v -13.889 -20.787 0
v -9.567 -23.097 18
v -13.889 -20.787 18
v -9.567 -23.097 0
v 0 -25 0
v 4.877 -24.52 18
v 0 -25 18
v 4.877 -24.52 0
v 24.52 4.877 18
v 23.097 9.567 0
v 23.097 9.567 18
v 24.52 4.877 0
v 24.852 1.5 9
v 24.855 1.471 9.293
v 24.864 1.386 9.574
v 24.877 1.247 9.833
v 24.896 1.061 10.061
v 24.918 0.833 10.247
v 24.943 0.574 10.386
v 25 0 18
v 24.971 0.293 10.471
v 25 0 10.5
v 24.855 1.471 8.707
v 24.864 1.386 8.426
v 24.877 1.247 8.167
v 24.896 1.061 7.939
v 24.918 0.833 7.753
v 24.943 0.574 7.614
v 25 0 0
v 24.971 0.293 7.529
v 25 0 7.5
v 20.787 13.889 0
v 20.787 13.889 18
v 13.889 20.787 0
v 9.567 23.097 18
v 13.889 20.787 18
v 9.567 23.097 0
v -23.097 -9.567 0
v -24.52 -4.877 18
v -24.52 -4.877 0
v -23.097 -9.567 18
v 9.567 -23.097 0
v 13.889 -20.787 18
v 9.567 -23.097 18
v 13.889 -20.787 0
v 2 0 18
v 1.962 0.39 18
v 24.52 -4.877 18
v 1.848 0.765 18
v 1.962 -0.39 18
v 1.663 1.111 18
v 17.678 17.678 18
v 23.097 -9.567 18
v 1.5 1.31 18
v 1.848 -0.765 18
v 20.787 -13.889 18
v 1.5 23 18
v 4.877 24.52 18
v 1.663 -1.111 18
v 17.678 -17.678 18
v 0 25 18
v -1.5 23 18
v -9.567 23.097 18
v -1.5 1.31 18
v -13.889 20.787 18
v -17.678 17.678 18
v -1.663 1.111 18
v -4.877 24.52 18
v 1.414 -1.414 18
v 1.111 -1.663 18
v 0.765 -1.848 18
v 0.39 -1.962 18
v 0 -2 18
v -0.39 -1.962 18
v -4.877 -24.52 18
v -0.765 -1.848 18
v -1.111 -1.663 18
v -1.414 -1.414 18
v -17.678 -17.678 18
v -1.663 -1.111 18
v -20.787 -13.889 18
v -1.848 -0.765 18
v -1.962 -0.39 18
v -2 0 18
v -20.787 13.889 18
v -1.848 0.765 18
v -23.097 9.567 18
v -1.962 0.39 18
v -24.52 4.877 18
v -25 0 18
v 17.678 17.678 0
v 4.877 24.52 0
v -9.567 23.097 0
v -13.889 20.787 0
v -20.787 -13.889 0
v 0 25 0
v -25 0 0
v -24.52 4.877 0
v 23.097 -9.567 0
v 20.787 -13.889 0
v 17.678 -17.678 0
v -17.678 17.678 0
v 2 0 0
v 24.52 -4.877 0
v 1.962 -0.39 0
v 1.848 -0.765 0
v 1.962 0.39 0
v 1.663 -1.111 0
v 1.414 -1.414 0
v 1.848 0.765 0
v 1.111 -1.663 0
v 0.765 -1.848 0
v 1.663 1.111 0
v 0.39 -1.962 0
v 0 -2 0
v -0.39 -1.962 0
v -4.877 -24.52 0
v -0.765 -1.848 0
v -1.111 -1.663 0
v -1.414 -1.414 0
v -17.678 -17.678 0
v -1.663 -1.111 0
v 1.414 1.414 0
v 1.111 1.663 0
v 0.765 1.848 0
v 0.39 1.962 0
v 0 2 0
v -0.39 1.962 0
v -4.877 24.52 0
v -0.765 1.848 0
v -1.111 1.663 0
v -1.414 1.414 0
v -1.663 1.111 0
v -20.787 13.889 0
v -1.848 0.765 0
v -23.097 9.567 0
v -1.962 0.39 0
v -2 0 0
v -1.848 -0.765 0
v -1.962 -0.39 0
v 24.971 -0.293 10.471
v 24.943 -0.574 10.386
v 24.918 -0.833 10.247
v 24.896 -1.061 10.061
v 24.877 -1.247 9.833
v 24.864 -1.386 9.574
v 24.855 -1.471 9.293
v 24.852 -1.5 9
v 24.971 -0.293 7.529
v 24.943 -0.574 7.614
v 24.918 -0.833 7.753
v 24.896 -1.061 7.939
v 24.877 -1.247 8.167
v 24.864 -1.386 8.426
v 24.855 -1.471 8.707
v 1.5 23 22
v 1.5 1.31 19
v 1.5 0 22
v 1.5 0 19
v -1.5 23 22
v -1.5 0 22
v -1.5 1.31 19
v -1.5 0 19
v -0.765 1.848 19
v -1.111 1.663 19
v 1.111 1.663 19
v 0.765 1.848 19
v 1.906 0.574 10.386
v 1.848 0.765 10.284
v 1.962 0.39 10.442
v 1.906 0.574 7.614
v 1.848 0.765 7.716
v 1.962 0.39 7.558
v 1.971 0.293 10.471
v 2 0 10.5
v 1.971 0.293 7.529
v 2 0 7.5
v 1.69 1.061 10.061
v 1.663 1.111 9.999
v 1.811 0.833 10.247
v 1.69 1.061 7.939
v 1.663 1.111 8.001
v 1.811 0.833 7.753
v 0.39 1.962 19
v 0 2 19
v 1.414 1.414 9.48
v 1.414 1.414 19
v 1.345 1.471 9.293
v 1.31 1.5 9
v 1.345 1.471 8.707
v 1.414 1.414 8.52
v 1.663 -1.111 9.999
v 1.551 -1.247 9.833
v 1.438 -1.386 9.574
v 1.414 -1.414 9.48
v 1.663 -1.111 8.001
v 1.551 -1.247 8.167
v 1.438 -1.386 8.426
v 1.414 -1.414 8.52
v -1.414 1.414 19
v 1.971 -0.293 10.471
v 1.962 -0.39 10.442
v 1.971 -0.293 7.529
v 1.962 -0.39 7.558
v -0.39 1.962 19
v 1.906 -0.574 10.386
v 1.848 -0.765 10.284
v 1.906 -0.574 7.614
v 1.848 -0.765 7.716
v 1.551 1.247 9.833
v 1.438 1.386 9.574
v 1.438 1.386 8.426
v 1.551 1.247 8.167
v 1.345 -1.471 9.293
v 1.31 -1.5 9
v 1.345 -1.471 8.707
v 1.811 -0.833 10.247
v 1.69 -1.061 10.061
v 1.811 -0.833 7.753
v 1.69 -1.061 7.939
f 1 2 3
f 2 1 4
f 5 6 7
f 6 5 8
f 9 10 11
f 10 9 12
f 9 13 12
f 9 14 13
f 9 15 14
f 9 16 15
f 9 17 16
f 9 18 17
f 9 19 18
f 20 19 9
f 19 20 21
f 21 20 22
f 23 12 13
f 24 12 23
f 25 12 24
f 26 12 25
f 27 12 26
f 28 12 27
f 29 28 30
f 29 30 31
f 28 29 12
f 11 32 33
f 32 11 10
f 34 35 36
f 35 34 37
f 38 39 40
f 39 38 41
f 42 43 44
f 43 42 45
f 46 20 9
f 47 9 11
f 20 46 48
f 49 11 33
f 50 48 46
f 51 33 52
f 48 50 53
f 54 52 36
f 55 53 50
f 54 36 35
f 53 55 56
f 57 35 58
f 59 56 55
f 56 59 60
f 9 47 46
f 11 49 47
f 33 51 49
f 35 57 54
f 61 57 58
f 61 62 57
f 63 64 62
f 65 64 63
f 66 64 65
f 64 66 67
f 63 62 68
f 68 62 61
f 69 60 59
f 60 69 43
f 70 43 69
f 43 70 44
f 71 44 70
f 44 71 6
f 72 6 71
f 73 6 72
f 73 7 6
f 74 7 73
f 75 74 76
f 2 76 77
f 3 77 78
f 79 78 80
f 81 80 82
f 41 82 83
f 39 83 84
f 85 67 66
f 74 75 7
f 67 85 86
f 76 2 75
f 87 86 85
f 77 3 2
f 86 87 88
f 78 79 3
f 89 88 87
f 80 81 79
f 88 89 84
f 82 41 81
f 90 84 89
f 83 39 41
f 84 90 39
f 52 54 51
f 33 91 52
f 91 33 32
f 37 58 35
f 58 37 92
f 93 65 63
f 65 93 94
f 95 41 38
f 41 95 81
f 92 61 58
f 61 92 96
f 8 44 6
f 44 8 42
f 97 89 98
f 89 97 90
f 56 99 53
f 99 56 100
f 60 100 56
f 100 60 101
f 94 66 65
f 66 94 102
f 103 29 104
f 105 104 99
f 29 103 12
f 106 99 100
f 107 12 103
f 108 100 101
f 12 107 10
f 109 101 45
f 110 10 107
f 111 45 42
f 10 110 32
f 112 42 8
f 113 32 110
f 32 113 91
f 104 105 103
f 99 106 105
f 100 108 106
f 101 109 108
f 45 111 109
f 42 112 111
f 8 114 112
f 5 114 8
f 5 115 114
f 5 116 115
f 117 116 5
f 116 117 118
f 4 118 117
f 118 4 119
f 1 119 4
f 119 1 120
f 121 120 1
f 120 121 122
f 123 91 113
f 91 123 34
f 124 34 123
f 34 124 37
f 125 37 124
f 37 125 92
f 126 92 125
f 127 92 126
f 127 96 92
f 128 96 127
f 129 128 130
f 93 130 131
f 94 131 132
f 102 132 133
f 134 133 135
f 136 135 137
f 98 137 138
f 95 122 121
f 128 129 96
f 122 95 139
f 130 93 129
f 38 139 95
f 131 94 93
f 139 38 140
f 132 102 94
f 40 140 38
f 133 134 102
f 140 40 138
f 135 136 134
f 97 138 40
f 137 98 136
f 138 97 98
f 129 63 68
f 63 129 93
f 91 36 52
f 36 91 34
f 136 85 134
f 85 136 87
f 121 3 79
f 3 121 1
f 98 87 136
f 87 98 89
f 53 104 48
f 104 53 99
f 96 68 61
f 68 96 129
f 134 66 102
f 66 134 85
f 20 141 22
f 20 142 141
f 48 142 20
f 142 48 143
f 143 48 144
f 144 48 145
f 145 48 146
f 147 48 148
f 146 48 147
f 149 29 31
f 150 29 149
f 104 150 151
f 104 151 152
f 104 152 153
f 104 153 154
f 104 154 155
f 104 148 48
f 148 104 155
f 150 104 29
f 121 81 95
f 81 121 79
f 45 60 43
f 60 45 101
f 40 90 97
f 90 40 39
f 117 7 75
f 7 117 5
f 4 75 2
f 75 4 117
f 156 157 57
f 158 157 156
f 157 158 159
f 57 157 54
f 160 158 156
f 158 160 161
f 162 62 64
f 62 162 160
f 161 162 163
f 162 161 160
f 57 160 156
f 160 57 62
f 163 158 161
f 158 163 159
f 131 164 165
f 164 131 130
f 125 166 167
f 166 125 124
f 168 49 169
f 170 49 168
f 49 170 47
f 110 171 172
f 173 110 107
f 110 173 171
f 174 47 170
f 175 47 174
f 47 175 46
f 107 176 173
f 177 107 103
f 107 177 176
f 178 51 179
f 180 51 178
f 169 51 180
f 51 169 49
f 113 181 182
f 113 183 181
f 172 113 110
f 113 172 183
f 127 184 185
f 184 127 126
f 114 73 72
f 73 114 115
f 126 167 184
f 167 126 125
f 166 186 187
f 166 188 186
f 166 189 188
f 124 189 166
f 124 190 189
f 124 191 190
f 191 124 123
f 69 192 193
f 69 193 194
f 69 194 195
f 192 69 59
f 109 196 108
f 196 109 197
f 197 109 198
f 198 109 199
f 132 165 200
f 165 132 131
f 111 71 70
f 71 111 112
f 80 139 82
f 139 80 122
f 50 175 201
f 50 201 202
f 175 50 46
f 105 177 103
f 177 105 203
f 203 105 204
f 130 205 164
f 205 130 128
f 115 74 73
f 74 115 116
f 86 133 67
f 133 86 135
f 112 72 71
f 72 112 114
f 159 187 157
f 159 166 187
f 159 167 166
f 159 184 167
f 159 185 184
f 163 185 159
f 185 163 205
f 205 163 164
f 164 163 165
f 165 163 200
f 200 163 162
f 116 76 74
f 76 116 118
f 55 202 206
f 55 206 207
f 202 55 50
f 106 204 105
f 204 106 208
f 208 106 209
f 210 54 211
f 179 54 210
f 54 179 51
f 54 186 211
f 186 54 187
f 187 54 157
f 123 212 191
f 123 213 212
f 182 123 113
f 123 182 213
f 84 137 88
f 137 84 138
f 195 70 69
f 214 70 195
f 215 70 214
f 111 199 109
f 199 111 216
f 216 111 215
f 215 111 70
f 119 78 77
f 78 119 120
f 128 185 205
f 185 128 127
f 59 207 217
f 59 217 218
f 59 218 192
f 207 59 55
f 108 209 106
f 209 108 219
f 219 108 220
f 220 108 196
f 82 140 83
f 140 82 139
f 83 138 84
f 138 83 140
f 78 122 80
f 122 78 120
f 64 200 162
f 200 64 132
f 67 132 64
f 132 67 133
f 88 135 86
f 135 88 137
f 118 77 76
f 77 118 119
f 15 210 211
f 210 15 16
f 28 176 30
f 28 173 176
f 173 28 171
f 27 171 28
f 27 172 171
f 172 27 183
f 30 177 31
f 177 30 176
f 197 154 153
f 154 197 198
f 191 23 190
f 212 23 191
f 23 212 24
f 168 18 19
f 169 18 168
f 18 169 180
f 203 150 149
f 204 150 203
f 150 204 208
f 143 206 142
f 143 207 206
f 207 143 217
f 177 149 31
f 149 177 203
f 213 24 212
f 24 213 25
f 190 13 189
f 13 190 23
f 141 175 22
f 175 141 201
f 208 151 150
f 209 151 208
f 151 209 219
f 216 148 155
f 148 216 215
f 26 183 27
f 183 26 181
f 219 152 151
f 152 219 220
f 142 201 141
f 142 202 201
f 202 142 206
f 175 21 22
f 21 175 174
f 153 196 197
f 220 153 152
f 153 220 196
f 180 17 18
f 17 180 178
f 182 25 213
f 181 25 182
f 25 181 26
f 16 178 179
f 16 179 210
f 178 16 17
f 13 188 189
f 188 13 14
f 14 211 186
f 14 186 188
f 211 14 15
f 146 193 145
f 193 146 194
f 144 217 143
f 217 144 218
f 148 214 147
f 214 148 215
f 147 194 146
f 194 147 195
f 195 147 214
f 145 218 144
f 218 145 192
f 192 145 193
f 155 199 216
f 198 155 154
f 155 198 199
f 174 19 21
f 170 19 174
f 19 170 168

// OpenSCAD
$fn = 32;

// ----------------------------------------------------------------------
// Control knob: pointer knob
// ----------------------------------------------------------------------

// --- parameters (mm) ---
rib_w = 3;                // pointer rib width
rib_h = 5;                // pointer rib height
knob_d = 50;              // knob body diameter
knob_h = 18;              // knob body height
bore_d = 4;               // shaft bore diameter
set_d = 3;                // set screw bore diameter
fit_tol = 0.1;            // tolerance for press fits, mm
free_tol = 0.3;           // tolerance for clearance fits, mm

rib_poke = rib_h - 1;  // rib height above the top
total_h = knob_h + rib_h - 1;  // overall height

difference() {
  union() {
    cylinder(h = knob_h, d = knob_d);
    translate([-rib_w / 2, 0, knob_h - 1])
      cube([rib_w, knob_d / 2 - 2, rib_h]);
  }
  translate([0, 0, -1]) cylinder(h = knob_h + 2, d = bore_d);
  translate([-1, 0, knob_h / 2]) rotate([0, 90, 0])
    cylinder(h = knob_d / 2 + bore_d / 2 + 2, d = set_d);}
